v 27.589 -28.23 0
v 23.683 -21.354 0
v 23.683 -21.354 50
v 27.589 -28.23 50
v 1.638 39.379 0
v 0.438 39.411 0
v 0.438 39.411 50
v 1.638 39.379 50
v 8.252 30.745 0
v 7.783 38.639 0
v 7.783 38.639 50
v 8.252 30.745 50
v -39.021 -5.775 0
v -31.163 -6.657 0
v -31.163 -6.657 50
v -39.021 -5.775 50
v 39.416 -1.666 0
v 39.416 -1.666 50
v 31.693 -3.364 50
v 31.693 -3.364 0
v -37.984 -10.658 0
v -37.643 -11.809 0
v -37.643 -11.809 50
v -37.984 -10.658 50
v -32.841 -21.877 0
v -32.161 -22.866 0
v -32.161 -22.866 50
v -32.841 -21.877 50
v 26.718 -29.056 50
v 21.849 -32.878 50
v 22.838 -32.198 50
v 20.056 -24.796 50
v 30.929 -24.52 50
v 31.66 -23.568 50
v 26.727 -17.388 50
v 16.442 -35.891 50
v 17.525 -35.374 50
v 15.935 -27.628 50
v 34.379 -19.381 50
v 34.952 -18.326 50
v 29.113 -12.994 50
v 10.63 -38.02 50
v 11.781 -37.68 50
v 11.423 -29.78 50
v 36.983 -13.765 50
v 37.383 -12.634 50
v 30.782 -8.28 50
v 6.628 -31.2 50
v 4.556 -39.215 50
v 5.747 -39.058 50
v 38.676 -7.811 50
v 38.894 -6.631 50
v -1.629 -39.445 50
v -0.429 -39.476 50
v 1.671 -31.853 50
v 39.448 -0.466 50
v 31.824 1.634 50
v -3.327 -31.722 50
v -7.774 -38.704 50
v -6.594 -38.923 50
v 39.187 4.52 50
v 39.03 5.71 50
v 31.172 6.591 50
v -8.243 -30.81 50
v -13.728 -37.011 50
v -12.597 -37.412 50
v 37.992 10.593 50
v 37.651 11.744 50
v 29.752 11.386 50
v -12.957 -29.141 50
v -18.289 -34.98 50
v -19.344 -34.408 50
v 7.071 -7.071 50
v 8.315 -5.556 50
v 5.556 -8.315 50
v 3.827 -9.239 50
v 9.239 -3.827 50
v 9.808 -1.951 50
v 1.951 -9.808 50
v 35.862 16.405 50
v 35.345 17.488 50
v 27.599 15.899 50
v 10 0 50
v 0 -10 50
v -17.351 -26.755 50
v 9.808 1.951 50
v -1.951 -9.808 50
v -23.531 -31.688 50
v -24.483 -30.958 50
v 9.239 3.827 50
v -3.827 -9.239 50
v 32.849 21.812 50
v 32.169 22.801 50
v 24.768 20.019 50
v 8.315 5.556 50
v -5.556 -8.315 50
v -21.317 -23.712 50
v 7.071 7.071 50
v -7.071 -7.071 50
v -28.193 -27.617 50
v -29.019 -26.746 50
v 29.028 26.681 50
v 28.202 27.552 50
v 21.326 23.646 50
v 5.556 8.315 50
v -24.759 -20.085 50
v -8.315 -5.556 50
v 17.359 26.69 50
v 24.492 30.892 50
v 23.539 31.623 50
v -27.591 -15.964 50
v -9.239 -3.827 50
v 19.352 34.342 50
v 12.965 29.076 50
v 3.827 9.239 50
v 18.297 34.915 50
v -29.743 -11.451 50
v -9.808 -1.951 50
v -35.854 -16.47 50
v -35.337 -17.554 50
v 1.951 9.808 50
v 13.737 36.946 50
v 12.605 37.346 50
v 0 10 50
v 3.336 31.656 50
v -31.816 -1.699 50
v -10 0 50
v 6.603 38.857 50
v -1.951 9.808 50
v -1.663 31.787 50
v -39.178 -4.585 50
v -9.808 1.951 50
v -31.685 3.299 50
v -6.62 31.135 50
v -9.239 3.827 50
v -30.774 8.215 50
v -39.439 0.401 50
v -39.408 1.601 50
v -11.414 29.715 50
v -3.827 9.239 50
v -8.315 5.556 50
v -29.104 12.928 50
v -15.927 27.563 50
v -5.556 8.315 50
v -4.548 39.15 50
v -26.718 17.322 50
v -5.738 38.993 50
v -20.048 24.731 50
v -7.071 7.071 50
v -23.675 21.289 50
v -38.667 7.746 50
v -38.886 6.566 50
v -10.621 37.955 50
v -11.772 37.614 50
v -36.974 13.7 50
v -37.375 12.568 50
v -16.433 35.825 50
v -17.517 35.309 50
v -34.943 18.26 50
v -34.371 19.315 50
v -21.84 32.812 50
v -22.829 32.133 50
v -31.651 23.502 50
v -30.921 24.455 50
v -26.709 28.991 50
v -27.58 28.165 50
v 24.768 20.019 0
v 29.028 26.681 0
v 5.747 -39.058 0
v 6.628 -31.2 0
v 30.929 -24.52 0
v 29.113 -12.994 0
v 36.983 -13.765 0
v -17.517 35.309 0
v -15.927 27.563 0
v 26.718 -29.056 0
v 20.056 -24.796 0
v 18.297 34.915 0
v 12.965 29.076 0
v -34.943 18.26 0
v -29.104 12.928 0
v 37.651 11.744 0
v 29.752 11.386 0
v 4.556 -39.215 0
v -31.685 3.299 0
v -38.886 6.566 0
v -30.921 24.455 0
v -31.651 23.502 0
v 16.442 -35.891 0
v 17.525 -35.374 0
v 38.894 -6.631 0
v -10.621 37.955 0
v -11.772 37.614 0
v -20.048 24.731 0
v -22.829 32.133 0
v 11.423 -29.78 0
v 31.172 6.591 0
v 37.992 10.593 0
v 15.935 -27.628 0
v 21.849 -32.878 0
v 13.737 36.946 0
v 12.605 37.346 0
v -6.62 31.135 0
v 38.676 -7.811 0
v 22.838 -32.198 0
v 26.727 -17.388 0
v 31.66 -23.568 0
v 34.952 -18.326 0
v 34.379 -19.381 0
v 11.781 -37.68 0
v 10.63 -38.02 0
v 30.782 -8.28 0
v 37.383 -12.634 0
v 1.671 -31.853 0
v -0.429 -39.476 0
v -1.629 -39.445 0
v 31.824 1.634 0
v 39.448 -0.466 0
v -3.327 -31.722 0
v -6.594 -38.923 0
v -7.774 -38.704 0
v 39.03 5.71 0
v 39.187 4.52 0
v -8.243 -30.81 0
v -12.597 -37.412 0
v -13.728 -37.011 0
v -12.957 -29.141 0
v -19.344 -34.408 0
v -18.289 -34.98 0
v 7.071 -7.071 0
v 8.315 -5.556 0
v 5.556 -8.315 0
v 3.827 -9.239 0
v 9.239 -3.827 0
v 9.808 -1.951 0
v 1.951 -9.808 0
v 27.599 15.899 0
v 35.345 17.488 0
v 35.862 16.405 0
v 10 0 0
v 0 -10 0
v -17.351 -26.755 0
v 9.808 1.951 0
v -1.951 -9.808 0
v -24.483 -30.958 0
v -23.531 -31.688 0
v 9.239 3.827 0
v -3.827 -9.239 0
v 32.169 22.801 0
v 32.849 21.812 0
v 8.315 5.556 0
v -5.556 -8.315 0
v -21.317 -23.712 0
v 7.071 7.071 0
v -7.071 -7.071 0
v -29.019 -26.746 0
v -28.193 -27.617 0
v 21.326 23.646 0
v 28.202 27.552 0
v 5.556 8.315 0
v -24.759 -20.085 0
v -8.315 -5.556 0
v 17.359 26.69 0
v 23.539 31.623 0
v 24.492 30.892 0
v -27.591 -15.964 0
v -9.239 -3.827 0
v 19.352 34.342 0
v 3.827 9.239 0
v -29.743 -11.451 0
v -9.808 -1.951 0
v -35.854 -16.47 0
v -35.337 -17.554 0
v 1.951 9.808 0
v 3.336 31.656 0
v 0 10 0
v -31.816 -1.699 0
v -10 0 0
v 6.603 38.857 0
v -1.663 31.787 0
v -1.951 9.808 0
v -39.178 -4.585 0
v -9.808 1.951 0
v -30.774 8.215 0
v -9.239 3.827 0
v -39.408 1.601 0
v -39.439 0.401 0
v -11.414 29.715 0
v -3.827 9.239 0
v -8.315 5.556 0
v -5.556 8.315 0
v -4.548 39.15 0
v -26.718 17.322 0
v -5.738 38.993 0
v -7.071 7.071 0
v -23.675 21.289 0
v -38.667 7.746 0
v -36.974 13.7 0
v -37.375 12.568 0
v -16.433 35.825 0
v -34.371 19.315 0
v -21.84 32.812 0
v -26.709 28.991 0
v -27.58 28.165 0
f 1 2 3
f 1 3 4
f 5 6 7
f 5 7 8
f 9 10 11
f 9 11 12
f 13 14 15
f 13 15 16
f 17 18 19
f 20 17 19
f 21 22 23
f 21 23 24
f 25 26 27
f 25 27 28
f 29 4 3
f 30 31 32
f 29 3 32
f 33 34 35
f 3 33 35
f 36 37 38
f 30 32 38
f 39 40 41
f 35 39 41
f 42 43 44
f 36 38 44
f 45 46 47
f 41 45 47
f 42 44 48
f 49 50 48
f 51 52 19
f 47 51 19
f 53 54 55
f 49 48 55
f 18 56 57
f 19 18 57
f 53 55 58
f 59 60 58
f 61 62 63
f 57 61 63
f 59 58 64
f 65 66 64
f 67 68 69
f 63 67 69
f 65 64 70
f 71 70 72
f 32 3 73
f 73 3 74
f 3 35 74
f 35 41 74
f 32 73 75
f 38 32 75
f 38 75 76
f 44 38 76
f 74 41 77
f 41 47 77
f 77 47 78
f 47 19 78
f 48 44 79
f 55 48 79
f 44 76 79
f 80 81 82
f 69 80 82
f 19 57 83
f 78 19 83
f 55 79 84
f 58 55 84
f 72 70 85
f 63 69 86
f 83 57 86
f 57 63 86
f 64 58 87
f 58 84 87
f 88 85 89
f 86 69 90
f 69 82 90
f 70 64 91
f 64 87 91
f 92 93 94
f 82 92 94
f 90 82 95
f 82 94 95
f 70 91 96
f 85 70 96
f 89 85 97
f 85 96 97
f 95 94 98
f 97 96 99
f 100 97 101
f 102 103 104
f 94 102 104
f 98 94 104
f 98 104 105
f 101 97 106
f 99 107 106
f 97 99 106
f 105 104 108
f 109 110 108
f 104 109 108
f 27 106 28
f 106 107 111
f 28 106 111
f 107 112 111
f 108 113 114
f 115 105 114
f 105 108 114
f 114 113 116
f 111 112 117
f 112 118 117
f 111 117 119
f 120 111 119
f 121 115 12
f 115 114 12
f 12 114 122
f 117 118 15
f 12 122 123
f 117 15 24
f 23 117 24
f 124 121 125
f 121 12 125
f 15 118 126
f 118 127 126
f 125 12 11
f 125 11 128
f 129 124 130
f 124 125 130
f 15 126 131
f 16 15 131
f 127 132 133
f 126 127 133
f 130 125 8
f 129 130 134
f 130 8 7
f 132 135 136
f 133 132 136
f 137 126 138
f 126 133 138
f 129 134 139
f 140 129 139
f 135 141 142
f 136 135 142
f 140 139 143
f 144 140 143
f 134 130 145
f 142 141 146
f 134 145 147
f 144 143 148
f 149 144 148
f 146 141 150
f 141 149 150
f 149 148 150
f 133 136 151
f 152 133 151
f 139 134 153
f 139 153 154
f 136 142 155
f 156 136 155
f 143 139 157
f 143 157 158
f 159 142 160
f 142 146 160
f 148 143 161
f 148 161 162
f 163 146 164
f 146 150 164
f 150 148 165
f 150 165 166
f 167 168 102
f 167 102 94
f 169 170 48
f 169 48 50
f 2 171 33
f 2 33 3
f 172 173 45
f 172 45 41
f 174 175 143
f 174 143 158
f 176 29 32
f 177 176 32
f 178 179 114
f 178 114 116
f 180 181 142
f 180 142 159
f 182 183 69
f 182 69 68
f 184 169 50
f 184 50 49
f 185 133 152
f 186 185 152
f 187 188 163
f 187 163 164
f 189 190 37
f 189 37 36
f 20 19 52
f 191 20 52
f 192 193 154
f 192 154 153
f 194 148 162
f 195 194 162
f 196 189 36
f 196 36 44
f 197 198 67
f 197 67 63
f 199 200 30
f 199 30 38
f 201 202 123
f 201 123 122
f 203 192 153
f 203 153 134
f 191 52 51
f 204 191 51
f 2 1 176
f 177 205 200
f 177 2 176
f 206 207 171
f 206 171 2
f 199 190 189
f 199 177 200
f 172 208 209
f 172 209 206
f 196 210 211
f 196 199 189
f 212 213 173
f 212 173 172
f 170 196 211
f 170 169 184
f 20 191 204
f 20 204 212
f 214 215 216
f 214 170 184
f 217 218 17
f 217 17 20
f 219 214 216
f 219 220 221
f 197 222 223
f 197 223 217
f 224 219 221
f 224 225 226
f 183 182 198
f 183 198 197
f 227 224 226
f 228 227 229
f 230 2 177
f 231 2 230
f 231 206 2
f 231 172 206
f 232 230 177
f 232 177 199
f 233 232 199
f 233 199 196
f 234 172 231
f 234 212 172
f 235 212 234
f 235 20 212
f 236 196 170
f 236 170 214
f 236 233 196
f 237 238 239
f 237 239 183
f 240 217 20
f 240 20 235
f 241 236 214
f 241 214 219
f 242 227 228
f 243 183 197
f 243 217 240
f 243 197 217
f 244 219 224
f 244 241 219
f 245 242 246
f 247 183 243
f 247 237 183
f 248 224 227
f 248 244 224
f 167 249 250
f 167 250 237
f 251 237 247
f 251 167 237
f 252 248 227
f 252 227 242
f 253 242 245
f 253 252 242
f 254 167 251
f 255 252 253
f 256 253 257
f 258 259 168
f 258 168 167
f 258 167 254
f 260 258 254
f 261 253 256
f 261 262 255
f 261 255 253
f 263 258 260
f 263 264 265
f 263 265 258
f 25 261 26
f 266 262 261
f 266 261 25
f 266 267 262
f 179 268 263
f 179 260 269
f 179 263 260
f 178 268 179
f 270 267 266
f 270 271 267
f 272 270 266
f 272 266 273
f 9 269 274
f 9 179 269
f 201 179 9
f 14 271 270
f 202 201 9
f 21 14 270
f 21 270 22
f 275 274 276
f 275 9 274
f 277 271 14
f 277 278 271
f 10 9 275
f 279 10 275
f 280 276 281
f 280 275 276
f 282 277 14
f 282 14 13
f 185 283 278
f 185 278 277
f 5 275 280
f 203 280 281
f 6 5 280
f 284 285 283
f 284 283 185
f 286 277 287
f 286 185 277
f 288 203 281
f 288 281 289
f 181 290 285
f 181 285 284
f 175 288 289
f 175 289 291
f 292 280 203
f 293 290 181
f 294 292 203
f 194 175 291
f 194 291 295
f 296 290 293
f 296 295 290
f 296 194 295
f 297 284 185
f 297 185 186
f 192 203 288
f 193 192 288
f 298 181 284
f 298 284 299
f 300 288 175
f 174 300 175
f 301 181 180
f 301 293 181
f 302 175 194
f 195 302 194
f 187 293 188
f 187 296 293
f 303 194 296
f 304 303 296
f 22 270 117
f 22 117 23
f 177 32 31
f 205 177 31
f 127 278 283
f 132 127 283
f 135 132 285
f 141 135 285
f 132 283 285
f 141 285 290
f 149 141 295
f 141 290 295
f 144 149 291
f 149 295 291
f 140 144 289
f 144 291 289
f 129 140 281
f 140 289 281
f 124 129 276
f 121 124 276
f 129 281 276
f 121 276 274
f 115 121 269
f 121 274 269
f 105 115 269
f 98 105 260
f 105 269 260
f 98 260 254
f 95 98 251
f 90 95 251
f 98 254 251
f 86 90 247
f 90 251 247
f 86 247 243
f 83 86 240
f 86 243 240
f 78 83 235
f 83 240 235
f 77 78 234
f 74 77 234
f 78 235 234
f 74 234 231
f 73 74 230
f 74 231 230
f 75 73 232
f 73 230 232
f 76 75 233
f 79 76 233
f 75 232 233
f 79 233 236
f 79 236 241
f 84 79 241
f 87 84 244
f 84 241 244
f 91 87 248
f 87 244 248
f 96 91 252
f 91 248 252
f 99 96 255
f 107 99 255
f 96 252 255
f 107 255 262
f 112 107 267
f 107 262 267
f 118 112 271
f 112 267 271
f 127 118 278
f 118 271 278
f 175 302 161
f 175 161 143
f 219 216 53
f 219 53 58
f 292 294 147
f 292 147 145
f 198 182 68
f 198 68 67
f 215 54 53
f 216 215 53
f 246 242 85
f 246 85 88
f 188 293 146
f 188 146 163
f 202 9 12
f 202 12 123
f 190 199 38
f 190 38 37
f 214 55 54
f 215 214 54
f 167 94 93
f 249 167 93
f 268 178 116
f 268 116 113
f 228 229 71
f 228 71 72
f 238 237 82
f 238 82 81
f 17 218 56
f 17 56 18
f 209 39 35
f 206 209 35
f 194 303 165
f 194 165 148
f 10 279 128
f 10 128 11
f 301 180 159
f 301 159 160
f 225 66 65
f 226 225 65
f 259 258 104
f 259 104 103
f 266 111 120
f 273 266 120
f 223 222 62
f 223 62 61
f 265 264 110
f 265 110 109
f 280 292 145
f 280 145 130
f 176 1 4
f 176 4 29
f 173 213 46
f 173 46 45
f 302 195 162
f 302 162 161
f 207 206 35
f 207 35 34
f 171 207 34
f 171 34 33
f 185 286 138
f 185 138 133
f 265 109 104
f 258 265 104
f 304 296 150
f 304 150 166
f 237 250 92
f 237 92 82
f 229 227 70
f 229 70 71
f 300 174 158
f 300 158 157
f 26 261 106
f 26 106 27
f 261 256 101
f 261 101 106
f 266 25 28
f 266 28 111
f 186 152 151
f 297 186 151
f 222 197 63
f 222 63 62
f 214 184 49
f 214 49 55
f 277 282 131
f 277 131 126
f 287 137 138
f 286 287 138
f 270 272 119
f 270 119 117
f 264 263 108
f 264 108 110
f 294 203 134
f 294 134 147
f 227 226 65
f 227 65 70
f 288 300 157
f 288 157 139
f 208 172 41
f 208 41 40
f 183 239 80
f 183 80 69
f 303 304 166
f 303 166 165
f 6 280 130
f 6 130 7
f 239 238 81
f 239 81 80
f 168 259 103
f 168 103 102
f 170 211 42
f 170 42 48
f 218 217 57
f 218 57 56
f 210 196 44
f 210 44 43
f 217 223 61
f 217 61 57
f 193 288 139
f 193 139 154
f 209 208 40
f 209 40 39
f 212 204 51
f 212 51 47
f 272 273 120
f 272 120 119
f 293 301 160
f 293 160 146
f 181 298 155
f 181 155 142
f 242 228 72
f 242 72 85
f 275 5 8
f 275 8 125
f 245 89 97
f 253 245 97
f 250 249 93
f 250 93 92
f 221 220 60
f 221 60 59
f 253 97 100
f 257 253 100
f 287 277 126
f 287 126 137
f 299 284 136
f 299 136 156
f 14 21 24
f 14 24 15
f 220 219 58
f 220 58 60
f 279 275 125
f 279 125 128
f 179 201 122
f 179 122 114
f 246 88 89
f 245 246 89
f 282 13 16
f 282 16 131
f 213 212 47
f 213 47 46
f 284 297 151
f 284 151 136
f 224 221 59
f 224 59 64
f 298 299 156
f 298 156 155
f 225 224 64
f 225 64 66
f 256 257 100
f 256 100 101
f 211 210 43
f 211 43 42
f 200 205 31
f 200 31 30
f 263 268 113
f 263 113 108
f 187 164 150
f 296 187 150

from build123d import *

# Parameters (mm, degrees)
BOSS_EXTRUDE1_DEPTH = 50
SKETCH2_R           = 10
CUT_EXTRUDE1_DEPTH  = 50


with BuildPart() as part:
    # Sketch1 → Boss-Extrude1 (new body)
    with BuildSketch(Plane.XY):
        Polygon((-6.619772583, 31.13494509), (-5.73799784, 38.993038365), (-4.547892767, 39.149686923), (-1.662532106, 31.787453214), (0.437663145, 39.41086036), (1.637621283, 39.379406864), (3.335751275, 31.656444617), (6.602653255, 38.857452051), (7.782917506, 38.638670991), (8.252003232, 30.745145167), (12.605169974, 37.346440186), (13.736678316, 36.945718677), (12.965169329, 29.075994081), (18.297411419, 34.915030894), (19.35230236, 34.342236029), (17.359195772, 26.690091397), (23.539215714, 31.623093539), (24.491514339, 30.892329429), (21.325887048, 23.646185959), (28.201512241, 27.551686544), (29.027769797, 26.680947028), (24.767570054, 20.01922882), (32.169499785, 22.801061463), (32.849371069, 21.811787037), (27.59949913, 15.898527702), (35.345473326, 17.488194451), (35.86221765, 16.404744334), (29.751942786, 11.385547942), (37.651229853, 11.743905927), (37.992123258, 10.592958256), (31.171900714, 6.59141408), (39.029993988, 5.709639337), (39.186642547, 4.519534265), (31.824408837, 1.634173603), (39.447815984, -0.466021647), (39.416362488, -1.665979785), (31.693400241, -3.364109777), (38.894407674, -6.631011757), (38.675626614, -7.811276009), (30.782100791, -8.280361735), (37.38339581, -12.633528476), (36.982674301, -13.765036818), (29.112949705, -12.993527831), (34.951986517, -18.325769921), (34.379191653, -19.380660863), (26.727047021, -17.387554274), (31.660049162, -23.567574216), (30.929285053, -24.519872841), (23.683141582, -21.354245551), (27.588642168, -28.229870743), (26.717902652, -29.056128299), (20.056184443, -24.795928556), (22.838017087, -32.197858288), (21.84874266, -32.877729572), (15.935483325, -27.627857633), (17.525150075, -35.373831828), (16.441699957, -35.890576153), (11.422503566, -29.780301288), (11.78086155, -37.679588355), (10.62991388, -38.02048176), (6.628369704, -31.200259216), (5.746594961, -39.058352491), (4.556489888, -39.215001049), (1.671129227, -31.85276734), (-0.429066024, -39.476174486), (-1.629024161, -39.44472099), (-3.327154153, -31.721758743), (-6.594056134, -38.922766177), (-7.774320385, -38.703985117), (-8.243406111, -30.810459293), (-12.596572853, -37.411754312), (-13.728081194, -37.011032803), (-12.956572207, -29.141308207), (-18.288814298, -34.98034502), (-19.343705239, -34.407550155), (-17.350598651, -26.755405523), (-23.530618592, -31.688407665), (-24.482917218, -30.957643555), (-21.317289927, -23.711500085), (-28.192915119, -27.61700067), (-29.019172675, -26.746261154), (-24.758972932, -20.084542946), (-32.160902664, -22.866375589), (-32.840773948, -21.877101162), (-27.590902009, -15.963841828), (-35.336876204, -17.553508577), (-35.853620529, -16.47005846), (-29.743345665, -11.450862068), (-37.642632731, -11.809220053), (-37.983526136, -10.658272382), (-31.163303592, -6.656728206), (-39.021396867, -5.774953463), (-39.178045425, -4.584848391), (-31.815811716, -1.699487729), (-39.439218862, 0.400707521), (-39.407765367, 1.600665659), (-31.68480312, 3.298795651), (-38.885810553, 6.565697631), (-38.667029493, 7.745961883), (-30.77350367, 8.215047609), (-37.374798689, 12.56821435), (-36.97407718, 13.699722692), (-29.104352583, 12.928213705), (-34.943389396, 18.260455795), (-34.370594532, 19.315346737), (-26.7184499, 17.322240148), (-31.651452041, 23.50226009), (-30.920687932, 24.454558715), (-23.674544461, 21.288931425), (-27.580045047, 28.164556617), (-26.70930553, 28.990814173), (-20.047587322, 24.73061443), (-22.829419966, 32.132544162), (-21.840145539, 32.812415446), (-15.926886204, 27.562543507), (-17.516552954, 35.308517702), (-16.433102836, 35.825262027), (-11.413906444, 29.714987162), (-11.772264429, 37.614274229), (-10.621316758, 37.955167634), align=None)
    extrude(amount=BOSS_EXTRUDE1_DEPTH)

    # Sketch2 → Cut-Extrude1 (cut)
    with BuildSketch(Plane(origin=(0, 0, 0), x_dir=(-1, 0, 0), z_dir=(0, 0, -1))):
        Circle(SKETCH2_R)
    extrude(amount=-CUT_EXTRUDE1_DEPTH, mode=Mode.SUBTRACT)


solid = part.part
